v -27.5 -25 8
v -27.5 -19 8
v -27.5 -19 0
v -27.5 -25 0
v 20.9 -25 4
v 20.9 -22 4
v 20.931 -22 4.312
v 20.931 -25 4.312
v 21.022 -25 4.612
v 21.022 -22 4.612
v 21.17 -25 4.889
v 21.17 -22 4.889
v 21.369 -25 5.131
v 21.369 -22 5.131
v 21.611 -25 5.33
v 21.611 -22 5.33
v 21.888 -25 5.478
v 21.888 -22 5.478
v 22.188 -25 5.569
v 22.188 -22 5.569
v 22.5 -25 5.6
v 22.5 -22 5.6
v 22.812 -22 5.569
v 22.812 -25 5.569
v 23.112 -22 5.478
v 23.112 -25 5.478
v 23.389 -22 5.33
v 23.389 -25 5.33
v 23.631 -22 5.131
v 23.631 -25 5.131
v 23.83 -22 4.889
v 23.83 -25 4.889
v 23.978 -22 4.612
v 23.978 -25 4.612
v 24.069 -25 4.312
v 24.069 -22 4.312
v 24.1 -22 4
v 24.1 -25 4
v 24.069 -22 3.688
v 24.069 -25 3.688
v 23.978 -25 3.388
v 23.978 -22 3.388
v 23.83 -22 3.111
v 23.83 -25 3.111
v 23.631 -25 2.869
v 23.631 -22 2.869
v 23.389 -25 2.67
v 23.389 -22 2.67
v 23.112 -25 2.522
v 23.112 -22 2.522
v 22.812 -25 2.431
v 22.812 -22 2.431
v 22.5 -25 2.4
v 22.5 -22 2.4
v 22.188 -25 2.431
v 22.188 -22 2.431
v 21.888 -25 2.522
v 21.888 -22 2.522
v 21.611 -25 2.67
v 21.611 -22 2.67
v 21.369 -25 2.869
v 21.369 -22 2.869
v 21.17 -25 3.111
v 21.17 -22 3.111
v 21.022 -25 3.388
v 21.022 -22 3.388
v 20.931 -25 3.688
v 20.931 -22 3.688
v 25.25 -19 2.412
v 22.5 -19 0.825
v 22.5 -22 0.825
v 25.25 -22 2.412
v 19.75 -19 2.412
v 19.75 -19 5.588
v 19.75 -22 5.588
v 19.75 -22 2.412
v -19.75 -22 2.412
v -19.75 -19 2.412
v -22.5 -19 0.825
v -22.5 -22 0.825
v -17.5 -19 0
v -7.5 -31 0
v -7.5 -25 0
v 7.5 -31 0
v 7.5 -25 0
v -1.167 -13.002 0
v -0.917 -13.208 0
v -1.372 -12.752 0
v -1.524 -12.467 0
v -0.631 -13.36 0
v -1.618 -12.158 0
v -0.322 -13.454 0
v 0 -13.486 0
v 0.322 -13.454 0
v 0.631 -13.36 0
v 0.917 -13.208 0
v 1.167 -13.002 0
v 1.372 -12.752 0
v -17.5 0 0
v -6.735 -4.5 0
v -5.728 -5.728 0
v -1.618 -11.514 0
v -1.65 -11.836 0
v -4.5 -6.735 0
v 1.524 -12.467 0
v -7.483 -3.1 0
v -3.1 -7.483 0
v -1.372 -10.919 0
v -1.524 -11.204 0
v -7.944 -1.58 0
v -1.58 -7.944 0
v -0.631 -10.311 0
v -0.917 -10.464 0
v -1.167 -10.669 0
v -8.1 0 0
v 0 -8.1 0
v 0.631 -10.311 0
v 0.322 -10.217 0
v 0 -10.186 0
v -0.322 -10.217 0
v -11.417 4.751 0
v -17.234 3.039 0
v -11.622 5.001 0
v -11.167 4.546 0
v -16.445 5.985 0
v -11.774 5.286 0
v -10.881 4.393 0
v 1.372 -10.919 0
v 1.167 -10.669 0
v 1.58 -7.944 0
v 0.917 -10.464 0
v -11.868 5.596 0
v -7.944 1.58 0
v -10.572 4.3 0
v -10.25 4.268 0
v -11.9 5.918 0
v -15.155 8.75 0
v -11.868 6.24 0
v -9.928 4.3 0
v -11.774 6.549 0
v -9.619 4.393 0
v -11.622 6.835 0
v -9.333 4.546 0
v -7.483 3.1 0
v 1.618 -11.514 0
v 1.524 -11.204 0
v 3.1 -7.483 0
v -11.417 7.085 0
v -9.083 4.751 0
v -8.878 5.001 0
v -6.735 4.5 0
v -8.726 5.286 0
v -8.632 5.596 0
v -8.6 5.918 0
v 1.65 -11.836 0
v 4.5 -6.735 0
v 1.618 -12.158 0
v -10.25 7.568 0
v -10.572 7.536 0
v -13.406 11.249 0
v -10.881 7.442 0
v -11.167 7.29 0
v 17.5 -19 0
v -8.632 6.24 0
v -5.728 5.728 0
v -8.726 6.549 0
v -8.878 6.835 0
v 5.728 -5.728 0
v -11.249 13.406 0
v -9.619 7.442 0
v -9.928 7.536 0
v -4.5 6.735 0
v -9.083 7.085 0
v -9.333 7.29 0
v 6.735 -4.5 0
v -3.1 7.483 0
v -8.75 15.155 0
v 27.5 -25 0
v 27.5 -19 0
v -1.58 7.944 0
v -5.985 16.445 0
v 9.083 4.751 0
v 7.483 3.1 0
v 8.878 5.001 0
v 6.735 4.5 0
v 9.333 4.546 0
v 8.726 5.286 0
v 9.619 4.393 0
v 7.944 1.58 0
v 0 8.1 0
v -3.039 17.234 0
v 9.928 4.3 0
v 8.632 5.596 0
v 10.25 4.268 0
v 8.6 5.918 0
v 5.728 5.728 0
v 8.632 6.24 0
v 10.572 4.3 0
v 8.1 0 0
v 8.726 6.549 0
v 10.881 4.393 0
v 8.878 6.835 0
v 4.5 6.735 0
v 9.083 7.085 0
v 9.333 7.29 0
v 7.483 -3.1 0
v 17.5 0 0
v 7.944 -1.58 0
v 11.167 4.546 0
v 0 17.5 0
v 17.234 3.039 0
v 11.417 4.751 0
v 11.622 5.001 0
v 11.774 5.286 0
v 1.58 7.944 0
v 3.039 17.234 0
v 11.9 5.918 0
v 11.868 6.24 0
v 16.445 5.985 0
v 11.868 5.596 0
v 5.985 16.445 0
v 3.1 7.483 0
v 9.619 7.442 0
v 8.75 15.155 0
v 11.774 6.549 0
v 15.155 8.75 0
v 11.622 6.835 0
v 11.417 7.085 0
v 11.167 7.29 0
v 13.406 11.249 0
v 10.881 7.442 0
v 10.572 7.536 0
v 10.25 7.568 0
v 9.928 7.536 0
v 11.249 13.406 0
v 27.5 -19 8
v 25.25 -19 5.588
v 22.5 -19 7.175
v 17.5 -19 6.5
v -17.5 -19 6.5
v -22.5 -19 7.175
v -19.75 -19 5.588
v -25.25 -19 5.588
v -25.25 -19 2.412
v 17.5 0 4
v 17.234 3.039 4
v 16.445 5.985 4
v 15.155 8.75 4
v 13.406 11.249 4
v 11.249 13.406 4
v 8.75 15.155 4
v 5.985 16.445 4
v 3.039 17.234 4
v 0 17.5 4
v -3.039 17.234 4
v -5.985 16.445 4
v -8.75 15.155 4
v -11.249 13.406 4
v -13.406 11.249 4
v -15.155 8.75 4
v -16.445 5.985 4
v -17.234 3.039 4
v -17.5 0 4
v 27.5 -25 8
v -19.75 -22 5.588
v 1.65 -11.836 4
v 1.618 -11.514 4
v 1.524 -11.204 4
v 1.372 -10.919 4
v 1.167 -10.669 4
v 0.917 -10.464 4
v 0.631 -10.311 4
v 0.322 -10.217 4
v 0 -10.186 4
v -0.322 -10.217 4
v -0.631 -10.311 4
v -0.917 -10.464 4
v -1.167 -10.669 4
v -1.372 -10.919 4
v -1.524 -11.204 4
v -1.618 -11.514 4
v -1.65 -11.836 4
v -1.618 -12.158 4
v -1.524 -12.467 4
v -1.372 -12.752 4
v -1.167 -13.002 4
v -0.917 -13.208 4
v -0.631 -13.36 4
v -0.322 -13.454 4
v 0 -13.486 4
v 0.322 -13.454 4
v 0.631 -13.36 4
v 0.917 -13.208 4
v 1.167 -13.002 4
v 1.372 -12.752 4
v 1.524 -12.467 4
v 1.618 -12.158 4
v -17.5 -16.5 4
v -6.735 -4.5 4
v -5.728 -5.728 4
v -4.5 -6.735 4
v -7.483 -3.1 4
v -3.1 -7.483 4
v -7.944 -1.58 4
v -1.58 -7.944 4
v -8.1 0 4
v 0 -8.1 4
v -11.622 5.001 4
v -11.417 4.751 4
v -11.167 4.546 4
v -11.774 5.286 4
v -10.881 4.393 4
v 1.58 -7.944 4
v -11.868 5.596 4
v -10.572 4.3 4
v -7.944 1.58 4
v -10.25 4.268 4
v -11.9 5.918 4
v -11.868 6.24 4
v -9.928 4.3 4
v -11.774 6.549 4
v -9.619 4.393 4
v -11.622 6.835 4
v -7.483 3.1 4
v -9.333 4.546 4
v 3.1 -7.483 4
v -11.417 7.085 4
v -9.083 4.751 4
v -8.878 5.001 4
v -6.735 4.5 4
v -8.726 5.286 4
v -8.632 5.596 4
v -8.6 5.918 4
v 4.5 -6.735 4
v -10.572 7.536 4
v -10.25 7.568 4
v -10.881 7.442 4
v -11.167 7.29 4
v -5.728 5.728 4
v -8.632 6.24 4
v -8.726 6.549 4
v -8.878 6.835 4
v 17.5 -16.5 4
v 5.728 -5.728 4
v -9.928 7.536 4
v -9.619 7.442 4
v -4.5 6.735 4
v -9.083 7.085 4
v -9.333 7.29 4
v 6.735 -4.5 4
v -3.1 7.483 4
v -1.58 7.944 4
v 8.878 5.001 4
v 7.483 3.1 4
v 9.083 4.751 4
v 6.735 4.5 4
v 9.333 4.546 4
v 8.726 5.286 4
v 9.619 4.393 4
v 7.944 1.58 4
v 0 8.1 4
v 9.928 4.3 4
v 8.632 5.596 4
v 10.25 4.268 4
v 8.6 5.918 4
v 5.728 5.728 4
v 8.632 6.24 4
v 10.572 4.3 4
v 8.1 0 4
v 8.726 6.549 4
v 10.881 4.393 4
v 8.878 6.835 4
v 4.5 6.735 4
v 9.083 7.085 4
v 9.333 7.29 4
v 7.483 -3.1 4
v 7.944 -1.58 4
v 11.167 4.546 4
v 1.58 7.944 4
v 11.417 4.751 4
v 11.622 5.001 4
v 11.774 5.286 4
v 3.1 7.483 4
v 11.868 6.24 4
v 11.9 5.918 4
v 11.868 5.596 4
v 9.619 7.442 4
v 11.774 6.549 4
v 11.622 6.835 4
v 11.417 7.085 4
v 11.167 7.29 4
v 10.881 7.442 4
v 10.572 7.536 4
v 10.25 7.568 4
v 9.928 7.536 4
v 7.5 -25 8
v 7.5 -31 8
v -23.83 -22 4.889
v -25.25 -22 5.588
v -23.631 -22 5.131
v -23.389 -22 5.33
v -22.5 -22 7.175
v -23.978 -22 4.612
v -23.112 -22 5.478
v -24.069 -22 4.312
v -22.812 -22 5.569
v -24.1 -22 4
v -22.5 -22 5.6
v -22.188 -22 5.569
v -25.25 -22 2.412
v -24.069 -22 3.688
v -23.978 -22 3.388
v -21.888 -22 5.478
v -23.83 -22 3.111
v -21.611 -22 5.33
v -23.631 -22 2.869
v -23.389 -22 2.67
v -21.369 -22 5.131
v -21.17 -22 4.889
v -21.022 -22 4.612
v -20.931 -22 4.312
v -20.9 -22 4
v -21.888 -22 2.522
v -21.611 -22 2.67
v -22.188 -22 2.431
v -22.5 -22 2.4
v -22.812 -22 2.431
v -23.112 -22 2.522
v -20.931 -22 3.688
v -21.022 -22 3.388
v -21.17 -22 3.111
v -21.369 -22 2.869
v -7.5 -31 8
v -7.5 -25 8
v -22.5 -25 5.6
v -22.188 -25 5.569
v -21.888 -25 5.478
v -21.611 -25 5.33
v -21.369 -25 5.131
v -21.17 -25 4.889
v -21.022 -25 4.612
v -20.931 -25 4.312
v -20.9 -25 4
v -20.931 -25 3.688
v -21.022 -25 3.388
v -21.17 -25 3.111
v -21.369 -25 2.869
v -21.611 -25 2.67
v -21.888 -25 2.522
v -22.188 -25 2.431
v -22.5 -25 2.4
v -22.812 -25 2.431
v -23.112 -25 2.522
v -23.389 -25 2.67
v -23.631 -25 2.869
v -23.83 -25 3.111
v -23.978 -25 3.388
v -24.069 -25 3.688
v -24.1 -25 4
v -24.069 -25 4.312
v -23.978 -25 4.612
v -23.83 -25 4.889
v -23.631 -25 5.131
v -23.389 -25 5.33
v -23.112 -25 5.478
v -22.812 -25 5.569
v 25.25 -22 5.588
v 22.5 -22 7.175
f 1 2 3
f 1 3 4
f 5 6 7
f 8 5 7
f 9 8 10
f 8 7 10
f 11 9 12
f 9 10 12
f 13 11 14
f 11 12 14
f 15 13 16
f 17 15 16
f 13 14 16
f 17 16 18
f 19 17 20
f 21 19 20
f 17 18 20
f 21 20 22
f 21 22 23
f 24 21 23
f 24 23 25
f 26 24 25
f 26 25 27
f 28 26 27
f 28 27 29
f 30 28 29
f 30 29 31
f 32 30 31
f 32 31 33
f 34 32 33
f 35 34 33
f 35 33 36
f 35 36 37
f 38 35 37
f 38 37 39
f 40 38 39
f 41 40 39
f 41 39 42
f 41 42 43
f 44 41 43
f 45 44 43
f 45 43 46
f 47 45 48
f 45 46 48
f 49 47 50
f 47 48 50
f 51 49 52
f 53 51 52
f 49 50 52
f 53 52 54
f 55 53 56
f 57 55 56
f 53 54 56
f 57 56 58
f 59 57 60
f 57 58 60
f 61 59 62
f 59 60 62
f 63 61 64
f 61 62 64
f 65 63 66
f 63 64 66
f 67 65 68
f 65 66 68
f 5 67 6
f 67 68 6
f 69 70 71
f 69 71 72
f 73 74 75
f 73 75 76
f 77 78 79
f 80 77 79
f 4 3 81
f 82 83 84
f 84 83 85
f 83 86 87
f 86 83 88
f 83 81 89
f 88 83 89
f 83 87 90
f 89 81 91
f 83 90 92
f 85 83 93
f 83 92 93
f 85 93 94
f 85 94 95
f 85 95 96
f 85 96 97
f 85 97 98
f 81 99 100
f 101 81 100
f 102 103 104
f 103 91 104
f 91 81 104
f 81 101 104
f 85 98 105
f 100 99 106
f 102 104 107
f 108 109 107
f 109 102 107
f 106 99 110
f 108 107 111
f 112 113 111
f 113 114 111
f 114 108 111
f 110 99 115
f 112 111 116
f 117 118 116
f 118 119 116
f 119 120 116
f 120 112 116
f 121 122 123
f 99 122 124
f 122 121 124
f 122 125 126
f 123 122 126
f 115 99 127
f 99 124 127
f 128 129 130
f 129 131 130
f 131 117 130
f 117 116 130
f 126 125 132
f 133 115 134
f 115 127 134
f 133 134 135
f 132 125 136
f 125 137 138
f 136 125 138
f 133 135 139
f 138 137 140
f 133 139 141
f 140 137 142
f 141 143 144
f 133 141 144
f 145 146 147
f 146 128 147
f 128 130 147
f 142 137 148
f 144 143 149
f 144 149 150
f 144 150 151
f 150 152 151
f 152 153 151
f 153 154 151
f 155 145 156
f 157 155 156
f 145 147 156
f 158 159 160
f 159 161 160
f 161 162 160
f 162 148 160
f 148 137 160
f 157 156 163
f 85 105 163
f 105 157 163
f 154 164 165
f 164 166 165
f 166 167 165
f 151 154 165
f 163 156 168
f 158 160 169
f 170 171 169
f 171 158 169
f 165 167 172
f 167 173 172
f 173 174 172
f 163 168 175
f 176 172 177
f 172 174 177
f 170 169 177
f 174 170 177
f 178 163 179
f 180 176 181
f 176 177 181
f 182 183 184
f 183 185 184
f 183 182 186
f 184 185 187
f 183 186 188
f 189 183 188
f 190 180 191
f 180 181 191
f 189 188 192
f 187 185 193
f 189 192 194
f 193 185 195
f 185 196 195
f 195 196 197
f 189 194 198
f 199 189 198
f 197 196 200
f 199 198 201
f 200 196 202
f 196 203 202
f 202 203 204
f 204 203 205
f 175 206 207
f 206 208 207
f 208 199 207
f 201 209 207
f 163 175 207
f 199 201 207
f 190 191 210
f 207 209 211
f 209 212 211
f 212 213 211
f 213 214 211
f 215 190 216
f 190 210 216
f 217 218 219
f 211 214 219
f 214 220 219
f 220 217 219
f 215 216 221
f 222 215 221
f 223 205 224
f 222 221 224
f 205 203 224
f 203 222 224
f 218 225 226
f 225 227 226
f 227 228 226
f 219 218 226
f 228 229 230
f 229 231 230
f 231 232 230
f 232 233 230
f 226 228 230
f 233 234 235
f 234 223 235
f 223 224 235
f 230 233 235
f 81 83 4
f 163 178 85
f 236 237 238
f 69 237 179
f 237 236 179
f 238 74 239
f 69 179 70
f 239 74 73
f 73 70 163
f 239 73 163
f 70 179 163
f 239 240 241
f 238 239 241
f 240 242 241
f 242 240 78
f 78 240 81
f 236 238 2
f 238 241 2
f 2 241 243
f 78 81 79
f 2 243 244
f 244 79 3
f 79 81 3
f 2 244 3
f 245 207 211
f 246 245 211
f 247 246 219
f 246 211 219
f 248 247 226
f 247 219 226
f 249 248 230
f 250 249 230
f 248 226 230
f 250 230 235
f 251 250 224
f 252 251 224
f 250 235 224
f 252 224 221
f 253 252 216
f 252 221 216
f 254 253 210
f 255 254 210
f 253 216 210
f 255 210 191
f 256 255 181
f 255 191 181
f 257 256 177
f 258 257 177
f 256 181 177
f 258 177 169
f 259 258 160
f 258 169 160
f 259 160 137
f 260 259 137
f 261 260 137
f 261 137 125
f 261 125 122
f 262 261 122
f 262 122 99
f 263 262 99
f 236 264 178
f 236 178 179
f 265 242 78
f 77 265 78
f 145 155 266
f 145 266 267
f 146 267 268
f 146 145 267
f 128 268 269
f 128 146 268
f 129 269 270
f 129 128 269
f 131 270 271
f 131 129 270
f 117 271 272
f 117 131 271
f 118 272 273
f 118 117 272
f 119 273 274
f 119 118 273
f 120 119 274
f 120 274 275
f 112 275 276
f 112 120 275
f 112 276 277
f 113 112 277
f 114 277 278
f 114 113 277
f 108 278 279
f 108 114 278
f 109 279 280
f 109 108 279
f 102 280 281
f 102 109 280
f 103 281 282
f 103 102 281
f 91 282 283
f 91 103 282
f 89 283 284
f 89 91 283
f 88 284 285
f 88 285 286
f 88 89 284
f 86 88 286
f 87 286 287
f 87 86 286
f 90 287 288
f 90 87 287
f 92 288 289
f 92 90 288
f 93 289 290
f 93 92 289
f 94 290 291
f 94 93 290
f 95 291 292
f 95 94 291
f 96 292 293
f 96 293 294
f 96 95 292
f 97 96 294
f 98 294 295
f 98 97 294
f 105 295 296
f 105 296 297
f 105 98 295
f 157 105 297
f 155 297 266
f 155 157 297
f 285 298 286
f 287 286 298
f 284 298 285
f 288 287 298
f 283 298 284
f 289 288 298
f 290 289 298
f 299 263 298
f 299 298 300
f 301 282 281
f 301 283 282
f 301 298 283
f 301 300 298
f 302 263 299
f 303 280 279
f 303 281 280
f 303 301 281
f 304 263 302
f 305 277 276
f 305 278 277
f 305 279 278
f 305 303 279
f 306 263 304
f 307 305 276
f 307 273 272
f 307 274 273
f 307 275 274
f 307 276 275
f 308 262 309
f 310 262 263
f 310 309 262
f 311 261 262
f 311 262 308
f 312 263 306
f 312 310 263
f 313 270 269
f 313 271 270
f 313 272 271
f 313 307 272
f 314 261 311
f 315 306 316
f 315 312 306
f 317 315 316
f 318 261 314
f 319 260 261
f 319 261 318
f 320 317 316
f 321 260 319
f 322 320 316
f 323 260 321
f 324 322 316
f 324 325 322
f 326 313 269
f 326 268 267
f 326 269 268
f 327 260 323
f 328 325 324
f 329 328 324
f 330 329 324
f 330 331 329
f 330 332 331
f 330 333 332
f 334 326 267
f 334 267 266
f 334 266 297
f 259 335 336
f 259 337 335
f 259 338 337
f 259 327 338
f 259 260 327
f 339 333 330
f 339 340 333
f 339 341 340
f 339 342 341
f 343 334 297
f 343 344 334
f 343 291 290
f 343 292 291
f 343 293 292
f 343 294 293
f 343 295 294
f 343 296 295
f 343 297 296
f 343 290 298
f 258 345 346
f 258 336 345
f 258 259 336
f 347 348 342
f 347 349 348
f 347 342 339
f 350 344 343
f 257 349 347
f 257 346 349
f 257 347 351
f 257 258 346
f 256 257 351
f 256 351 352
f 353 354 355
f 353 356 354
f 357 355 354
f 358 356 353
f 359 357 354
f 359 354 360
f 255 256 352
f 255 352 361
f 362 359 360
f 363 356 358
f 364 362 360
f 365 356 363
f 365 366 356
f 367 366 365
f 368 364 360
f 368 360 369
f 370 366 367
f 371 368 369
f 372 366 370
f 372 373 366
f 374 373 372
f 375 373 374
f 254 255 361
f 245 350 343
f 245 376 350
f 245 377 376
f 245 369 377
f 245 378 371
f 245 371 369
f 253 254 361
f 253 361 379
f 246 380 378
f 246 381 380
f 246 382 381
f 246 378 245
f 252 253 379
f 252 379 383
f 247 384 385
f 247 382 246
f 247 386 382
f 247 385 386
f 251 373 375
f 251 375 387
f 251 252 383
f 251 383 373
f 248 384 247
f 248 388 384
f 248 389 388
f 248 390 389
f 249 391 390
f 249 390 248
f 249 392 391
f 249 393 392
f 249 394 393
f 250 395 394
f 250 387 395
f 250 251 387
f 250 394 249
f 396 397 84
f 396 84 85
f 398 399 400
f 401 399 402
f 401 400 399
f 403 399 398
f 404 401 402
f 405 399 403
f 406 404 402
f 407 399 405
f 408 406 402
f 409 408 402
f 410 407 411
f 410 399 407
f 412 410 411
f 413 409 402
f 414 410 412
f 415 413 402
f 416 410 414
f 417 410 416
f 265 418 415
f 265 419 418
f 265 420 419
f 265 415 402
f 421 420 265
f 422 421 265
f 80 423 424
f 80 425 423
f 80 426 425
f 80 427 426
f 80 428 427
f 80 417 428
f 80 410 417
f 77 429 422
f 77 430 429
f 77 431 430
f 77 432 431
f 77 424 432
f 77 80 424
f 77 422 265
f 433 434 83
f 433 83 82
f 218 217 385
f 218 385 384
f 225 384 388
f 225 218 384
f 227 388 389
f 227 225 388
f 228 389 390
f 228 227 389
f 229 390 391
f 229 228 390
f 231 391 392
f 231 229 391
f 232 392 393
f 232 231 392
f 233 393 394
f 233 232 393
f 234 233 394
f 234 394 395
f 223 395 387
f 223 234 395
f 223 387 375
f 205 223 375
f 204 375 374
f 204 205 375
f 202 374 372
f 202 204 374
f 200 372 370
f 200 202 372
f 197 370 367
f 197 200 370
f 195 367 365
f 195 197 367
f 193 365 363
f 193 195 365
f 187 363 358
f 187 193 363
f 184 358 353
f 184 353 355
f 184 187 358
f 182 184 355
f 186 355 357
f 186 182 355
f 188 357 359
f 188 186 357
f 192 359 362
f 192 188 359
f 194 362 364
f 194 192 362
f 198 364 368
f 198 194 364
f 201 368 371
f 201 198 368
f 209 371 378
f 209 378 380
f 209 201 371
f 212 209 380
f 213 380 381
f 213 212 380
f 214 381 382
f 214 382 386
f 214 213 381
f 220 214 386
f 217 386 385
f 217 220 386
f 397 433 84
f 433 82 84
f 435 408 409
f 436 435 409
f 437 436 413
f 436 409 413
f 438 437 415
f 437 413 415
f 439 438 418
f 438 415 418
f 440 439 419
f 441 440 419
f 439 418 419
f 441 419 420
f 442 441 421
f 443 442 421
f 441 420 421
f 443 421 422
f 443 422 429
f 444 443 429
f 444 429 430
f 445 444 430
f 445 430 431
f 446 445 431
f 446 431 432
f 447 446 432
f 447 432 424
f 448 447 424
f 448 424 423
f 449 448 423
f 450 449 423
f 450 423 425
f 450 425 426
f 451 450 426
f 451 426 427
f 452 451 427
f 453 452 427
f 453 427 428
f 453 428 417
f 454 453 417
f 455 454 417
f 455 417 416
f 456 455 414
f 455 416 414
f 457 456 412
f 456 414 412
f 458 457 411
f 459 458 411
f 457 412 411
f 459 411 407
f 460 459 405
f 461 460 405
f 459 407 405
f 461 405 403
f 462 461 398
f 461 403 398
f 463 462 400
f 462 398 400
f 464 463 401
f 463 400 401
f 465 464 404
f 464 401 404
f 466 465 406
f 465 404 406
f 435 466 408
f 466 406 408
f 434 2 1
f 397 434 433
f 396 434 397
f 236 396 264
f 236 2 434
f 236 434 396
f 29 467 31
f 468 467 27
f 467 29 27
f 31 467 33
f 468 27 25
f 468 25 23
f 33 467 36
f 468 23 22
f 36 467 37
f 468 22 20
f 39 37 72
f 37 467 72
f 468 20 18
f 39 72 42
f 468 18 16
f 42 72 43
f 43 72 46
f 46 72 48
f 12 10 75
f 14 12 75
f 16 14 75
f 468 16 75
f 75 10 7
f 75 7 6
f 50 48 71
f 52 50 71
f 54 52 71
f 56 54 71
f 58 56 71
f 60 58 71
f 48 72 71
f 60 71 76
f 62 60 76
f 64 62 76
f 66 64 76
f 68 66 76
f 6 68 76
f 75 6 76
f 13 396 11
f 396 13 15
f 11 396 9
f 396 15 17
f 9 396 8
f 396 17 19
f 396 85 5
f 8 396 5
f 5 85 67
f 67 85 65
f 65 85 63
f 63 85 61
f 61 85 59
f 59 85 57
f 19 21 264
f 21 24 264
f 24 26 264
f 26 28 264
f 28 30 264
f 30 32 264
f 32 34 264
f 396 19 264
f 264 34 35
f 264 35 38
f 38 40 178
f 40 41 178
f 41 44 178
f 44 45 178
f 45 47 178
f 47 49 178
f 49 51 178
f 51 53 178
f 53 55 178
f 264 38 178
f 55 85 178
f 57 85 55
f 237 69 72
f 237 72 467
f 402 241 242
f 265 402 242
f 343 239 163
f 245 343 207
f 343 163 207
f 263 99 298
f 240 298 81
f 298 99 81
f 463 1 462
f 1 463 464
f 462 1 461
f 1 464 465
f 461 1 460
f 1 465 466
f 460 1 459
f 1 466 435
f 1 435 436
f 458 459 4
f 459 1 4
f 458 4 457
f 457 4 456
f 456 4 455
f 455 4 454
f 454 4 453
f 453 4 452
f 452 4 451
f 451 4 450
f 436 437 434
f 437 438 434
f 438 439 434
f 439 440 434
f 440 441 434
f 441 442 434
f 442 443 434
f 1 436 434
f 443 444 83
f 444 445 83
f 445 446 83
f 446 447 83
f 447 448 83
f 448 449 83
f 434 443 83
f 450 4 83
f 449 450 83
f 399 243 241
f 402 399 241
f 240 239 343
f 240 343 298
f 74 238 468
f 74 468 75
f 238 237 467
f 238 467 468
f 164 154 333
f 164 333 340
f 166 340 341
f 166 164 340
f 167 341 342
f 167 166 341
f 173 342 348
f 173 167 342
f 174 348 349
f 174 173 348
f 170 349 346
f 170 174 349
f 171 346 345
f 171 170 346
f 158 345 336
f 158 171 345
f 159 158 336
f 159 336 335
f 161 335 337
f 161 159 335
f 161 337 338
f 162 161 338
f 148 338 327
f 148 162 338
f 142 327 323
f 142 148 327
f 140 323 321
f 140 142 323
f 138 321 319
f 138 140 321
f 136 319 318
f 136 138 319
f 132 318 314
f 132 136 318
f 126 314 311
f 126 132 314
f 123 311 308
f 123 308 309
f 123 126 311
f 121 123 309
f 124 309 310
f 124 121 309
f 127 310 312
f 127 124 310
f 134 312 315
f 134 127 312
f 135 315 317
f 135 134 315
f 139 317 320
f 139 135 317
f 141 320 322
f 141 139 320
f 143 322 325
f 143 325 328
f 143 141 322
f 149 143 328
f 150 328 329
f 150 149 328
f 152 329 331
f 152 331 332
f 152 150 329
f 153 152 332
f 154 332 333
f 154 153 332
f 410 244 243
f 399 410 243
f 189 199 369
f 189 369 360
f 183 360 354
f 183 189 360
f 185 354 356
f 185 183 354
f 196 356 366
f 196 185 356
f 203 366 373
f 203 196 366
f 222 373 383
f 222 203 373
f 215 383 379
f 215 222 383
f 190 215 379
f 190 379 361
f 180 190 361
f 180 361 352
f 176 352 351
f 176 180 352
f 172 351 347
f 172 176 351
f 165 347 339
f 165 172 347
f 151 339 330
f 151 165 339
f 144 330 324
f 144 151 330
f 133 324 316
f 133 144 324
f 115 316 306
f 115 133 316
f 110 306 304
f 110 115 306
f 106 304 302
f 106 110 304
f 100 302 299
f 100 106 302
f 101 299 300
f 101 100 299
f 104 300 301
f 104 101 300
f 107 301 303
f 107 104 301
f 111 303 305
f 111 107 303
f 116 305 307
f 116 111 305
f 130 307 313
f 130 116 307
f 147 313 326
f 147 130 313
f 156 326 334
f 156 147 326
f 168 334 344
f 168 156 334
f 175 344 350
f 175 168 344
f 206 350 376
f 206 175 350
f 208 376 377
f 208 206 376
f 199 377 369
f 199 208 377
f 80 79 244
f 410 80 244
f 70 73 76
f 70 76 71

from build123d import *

# Parameters (mm, degrees)
ESQUISSE1_R             = 8.1
ESQUISSE1_R_2           = 1.65
BOSS_EXTRU_1_DEPTH      = 4
BOSS_EXTRU_2_DEPTH      = 4
CHANFREIN1_SIZE         = 2.5
ENL_V_MAT_EXTRU_1_DEPTH = 3
ESQUISSE5_R             = 1.6
ENL_V_MAT_EXTRU_2_DEPTH = 47.395042839


with BuildPart() as part:
    # Esquisse1 → Boss.-Extru.1 (new body)
    with BuildSketch(Plane.XY):
        with BuildLine():
            Line((-27.5, -19), (-27.5, -25))
            Line((-27.5, -25), (-7.5, -25))
            Line((-7.5, -25), (-7.5, -31))
            Line((-7.5, -31), (7.5, -31))
            Line((7.5, -31), (7.5, -25))
            Line((7.5, -25), (27.5, -25))
            Line((27.5, -25), (27.5, -19))
            Line((27.5, -19), (17.5, -19))
            Line((17.5, -19), (17.5, 0))
            ThreePointArc((17.5, 0), (0, 17.5), (-17.5, 0))
            Line((-17.5, 0), (-17.5, -19))
            Line((-17.5, -19), (-27.5, -19))
        make_face()
        Circle(ESQUISSE1_R, mode=Mode.SUBTRACT)
        with Locations((-10.25, 5.917840259)):
            Circle(ESQUISSE1_R_2, mode=Mode.SUBTRACT)
        with Locations((10.25, 5.917840259)):
            Circle(ESQUISSE1_R_2, mode=Mode.SUBTRACT)
        with Locations((0, -11.835680518)):
            Circle(ESQUISSE1_R_2, mode=Mode.SUBTRACT)
    extrude(amount=BOSS_EXTRU_1_DEPTH)

    # Esquisse2 → Boss.-Extru.2 (add)
    with BuildSketch(Plane.XY.offset(4)):
        Polygon((-27.5, -25), (-7.5, -25), (-7.5, -31), (7.5, -31), (7.5, -25), (27.5, -25), (27.5, -19), (-27.5, -19), align=None)
    extrude(amount=BOSS_EXTRU_2_DEPTH)

    # Chanfrein1
    chanfrein1_edges = [part.edges().sort_by_distance(p)[0] for p in [
        (0, -19, 4),
    ]]
    chamfer(chanfrein1_edges, length=CHANFREIN1_SIZE)

    # Esquisse3 → Enlèv. mat.-Extru.1 (cut)
    with BuildSketch(Plane(origin=(0, -19, 0), x_dir=(1, 0, 0), z_dir=(0, 1, 0))):
        Polygon((19.75, -2.41228676), (22.5, -0.824573519), (25.25, -2.41228676), (25.25, -5.58771324), (22.5, -7.175426481), (19.75, -5.58771324), align=None)
        Polygon((-22.5, -0.824573519), (-25.25, -2.41228676), (-25.25, -5.58771324), (-22.5, -7.175426481), (-19.75, -5.58771324), (-19.75, -2.41228676), align=None)
    extrude(amount=-ENL_V_MAT_EXTRU_1_DEPTH, mode=Mode.SUBTRACT)

    # Esquisse5 → Enlèv. mat.-Extru.2 (cut, through all)
    with BuildSketch(Plane(origin=(0, -19, 0), x_dir=(1, 0, 0), z_dir=(0, 1, 0))):
        with Locations(Location((-22.5, -4, 0), (0, 0, 270))):
            Circle(ESQUISSE5_R)
        with Locations(Location((22.5, -4, 0), (0, 0, 180))):
            Circle(ESQUISSE5_R)
    extrude(amount=-ENL_V_MAT_EXTRU_2_DEPTH, mode=Mode.SUBTRACT)


solid = part.part
